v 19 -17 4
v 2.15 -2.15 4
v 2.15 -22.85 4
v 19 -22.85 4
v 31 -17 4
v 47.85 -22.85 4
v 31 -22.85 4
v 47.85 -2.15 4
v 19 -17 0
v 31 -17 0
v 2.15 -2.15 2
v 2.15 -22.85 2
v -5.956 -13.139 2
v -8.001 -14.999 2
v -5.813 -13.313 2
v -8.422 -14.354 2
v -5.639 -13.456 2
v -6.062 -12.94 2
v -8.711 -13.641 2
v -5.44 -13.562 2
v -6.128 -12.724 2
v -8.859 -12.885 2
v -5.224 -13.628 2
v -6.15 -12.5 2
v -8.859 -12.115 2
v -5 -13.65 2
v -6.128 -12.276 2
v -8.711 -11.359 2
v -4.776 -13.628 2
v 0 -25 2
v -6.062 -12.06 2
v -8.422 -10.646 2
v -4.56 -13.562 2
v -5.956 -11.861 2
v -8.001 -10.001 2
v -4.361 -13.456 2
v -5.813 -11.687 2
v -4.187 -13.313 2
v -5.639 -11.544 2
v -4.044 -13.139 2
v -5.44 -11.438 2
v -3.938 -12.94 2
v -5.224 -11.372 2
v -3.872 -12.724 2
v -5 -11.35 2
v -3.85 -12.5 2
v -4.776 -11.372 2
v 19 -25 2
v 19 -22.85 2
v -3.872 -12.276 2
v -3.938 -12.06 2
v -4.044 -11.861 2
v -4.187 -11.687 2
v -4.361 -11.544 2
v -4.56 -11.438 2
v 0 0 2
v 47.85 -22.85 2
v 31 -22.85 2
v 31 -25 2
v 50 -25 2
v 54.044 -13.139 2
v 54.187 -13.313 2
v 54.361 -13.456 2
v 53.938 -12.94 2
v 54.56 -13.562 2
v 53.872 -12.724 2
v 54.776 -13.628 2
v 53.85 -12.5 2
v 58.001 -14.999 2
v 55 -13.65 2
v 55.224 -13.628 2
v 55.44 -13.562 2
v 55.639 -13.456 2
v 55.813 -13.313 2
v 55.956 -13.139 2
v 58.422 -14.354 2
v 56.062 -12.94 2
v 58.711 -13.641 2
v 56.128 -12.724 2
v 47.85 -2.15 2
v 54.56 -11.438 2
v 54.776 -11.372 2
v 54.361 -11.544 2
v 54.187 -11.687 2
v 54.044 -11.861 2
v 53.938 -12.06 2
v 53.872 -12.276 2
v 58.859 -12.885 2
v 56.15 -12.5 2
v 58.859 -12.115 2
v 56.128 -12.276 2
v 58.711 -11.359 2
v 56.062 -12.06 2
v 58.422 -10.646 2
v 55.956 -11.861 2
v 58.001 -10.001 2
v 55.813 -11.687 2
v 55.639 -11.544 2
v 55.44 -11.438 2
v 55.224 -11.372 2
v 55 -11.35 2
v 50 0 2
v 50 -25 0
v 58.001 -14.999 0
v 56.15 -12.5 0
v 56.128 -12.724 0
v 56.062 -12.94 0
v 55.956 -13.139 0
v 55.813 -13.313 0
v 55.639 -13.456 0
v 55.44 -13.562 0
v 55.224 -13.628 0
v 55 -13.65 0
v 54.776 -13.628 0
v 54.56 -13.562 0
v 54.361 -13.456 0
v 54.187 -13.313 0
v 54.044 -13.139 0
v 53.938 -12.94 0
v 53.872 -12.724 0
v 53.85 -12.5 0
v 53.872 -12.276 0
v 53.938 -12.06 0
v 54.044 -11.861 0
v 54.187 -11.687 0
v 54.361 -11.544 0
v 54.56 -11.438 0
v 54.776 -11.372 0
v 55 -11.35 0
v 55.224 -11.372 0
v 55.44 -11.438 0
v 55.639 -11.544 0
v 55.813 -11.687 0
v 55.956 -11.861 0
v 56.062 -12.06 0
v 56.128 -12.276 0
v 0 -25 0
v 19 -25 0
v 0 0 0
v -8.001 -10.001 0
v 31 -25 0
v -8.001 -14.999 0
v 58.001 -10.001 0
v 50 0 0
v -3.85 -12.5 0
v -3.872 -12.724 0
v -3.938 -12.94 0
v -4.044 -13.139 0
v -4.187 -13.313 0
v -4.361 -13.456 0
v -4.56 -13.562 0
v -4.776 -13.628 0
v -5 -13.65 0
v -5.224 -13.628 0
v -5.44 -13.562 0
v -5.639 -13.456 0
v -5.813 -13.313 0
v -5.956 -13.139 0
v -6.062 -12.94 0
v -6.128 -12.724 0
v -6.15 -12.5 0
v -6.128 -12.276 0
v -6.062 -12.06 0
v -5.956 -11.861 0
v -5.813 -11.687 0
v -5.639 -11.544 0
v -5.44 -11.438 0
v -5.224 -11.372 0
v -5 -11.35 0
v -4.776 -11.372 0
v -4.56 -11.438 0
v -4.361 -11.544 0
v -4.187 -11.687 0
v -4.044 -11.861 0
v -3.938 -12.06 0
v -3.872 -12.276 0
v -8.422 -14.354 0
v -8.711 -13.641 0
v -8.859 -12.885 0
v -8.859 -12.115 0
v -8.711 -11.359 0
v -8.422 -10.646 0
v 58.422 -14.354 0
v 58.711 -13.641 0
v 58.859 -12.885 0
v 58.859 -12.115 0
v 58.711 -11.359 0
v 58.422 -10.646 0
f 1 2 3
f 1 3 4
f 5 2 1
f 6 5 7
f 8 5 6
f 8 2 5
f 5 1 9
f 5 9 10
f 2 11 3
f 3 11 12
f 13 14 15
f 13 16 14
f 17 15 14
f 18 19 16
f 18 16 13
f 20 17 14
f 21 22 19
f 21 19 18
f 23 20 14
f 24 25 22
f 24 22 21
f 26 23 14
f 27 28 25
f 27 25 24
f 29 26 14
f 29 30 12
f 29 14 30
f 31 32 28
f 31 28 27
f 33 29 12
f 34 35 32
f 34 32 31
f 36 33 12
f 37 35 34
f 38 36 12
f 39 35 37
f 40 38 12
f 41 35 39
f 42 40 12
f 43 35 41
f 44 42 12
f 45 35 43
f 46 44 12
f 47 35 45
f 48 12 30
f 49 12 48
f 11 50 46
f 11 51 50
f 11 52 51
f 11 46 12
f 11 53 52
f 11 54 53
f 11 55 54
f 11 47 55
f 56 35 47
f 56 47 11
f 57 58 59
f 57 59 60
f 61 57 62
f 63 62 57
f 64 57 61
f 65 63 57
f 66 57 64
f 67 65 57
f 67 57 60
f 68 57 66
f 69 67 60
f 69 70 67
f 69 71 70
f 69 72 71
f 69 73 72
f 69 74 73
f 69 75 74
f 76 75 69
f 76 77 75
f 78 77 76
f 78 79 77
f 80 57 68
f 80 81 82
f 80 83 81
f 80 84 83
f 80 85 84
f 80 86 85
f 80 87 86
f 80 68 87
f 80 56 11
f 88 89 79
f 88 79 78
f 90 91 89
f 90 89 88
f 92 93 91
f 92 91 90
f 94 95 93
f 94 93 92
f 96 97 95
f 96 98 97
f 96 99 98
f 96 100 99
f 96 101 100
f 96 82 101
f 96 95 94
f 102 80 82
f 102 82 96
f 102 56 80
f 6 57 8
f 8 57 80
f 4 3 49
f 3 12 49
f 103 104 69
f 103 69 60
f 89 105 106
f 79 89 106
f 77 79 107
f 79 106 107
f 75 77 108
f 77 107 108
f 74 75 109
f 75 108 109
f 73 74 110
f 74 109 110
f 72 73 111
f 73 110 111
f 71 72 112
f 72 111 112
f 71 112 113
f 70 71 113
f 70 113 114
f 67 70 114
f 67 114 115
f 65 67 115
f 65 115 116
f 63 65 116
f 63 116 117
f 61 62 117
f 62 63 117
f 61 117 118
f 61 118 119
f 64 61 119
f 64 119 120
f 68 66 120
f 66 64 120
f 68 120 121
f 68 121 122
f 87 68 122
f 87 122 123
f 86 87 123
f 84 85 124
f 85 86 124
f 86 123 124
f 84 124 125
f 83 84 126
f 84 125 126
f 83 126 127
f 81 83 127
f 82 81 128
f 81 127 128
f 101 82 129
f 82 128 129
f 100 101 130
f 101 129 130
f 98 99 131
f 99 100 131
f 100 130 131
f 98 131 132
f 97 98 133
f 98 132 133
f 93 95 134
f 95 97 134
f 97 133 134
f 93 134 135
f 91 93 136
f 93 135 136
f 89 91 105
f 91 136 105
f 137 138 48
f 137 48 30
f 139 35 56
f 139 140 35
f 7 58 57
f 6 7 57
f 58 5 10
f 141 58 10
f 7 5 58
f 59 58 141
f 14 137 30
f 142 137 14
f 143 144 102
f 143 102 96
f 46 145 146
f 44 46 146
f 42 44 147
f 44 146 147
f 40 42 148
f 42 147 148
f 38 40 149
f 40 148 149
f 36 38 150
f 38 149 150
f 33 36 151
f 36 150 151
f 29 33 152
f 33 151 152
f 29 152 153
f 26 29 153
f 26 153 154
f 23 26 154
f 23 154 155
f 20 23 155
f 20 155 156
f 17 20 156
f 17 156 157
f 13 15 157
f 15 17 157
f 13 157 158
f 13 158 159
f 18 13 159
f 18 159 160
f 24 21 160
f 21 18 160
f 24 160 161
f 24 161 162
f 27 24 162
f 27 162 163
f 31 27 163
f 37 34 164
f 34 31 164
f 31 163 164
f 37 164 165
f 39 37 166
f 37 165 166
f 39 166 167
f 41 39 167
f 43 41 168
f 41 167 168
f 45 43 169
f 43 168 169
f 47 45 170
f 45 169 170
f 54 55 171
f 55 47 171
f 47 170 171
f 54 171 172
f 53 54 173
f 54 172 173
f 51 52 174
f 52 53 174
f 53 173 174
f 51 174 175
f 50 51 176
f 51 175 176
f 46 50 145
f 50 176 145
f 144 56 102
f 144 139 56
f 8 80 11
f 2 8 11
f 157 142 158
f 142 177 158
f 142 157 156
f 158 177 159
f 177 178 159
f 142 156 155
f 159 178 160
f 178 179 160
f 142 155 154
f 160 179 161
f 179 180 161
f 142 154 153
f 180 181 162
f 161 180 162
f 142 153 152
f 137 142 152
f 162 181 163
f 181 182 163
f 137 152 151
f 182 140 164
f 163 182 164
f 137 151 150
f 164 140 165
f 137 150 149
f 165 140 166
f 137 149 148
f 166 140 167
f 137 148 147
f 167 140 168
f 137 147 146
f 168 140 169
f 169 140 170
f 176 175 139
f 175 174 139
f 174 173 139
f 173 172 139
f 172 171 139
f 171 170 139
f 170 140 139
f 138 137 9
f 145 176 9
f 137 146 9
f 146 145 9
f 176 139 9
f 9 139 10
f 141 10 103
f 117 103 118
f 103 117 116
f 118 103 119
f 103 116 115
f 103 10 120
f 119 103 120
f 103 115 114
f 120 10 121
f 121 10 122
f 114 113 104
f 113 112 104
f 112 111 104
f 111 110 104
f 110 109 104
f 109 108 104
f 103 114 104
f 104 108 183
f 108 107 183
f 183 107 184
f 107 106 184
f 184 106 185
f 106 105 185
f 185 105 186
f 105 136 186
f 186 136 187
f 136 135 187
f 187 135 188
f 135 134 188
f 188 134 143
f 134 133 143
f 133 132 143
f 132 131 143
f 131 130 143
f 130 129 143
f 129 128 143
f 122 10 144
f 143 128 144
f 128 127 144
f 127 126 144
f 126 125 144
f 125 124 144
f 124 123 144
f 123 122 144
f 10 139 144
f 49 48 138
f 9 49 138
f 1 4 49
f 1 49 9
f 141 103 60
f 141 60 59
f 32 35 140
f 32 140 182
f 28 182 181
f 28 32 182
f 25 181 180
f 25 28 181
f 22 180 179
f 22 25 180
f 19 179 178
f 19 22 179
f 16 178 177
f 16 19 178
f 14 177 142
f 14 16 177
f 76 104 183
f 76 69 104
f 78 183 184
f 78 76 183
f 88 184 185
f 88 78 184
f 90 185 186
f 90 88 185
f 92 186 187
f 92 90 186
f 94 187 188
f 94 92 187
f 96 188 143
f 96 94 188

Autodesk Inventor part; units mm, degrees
ref_plane "YZ Plane" through (0, 0, 0) normal (1, 0, 0) x (0, 1, 0)
ref_plane "XZ Plane" through (0, 0, 0) normal (0, 1, 0) x (-1, 0, 0)
ref_plane "XY Plane" through (0, 0, 0) normal (0, 0, 1) x (1, 0, 0)
sketch "Sketch1" plane through (0, 0, 0) normal (0, 0, 1) x (1, 0, 0)
  line L0 (0, 0) -> (50, 0)
  line L1 (50, 0) -> (50, -25)
  line L2 (50, -25) -> (0, -25)
  line L3 (0, -25) -> (0, 0)
  line L4 (50, 0) -> (60, -12.5)
  line L5 (60, -12.5) -> (50, -25)
  line L6 (0, -25) -> (-10, -12.5)
  line L7 (-10, -12.5) -> (0, 0)
  circle A0 centre (55, -12.5) radius 1.15
  circle A1 centre (-5, -12.5) radius 1.15
  dimension "d0" = 50
  dimension "d1" = 25
  dimension "d18" = 12.5
  dimension "d19" = 10
  dimension "d20" = 10
  dimension "d21" = 2.3
  dimension "d22" = 2.3
  dimension "d23" = 5
  dimension "d24" = 5
extrude "Extrusion1" add sketch "Sketch1" along normal blind 2
sketch "Sketch4" plane through (0, 0, 2) normal (0, 0, 1) x (1, 0, 0)
  line L0 (2.15, -22.85) -> (47.85, -22.85)
  line L1 (47.85, -22.85) -> (47.85, -2.15)
  line L2 (47.85, -2.15) -> (2.15, -2.15)
  line L3 (2.15, -2.15) -> (2.15, -22.85)
  point P0 (0, 0)
  point P1 (2.15, -12.5)
  point P2 (50, -25)
  dimension "d25" = 20.7
  dimension "d26" = 2.15
  dimension "d27" = 45.7
  dimension "d28" = 2.15
extrude "Extrusion4" add sketch "Sketch4" along normal blind 2
sketch "Sketch5" plane through (0, 0, 4) normal (0, 0, 1) x (1, 0, 0)
  line L0 (0, -25) -> (50, -25) projected
  line L1 (31, -25) -> (19, -25)
  line L2 (19, -25) -> (19, -17)
  line L3 (19, -17) -> (31, -17)
  line L4 (31, -17) -> (31, -25)
  point P0 (0, 0)
  dimension "d31" = 19
  dimension "d32" = 12
  dimension "d33" = 8
extrude "Extrusion5" cut sketch "Sketch5" against normal through all
fillet "Fillet1" radius 4 2 edges at (-10, -12.5, 1) (60, -12.5, 1)
properties part number "UltrasonicSensorMountTest_backplate"
